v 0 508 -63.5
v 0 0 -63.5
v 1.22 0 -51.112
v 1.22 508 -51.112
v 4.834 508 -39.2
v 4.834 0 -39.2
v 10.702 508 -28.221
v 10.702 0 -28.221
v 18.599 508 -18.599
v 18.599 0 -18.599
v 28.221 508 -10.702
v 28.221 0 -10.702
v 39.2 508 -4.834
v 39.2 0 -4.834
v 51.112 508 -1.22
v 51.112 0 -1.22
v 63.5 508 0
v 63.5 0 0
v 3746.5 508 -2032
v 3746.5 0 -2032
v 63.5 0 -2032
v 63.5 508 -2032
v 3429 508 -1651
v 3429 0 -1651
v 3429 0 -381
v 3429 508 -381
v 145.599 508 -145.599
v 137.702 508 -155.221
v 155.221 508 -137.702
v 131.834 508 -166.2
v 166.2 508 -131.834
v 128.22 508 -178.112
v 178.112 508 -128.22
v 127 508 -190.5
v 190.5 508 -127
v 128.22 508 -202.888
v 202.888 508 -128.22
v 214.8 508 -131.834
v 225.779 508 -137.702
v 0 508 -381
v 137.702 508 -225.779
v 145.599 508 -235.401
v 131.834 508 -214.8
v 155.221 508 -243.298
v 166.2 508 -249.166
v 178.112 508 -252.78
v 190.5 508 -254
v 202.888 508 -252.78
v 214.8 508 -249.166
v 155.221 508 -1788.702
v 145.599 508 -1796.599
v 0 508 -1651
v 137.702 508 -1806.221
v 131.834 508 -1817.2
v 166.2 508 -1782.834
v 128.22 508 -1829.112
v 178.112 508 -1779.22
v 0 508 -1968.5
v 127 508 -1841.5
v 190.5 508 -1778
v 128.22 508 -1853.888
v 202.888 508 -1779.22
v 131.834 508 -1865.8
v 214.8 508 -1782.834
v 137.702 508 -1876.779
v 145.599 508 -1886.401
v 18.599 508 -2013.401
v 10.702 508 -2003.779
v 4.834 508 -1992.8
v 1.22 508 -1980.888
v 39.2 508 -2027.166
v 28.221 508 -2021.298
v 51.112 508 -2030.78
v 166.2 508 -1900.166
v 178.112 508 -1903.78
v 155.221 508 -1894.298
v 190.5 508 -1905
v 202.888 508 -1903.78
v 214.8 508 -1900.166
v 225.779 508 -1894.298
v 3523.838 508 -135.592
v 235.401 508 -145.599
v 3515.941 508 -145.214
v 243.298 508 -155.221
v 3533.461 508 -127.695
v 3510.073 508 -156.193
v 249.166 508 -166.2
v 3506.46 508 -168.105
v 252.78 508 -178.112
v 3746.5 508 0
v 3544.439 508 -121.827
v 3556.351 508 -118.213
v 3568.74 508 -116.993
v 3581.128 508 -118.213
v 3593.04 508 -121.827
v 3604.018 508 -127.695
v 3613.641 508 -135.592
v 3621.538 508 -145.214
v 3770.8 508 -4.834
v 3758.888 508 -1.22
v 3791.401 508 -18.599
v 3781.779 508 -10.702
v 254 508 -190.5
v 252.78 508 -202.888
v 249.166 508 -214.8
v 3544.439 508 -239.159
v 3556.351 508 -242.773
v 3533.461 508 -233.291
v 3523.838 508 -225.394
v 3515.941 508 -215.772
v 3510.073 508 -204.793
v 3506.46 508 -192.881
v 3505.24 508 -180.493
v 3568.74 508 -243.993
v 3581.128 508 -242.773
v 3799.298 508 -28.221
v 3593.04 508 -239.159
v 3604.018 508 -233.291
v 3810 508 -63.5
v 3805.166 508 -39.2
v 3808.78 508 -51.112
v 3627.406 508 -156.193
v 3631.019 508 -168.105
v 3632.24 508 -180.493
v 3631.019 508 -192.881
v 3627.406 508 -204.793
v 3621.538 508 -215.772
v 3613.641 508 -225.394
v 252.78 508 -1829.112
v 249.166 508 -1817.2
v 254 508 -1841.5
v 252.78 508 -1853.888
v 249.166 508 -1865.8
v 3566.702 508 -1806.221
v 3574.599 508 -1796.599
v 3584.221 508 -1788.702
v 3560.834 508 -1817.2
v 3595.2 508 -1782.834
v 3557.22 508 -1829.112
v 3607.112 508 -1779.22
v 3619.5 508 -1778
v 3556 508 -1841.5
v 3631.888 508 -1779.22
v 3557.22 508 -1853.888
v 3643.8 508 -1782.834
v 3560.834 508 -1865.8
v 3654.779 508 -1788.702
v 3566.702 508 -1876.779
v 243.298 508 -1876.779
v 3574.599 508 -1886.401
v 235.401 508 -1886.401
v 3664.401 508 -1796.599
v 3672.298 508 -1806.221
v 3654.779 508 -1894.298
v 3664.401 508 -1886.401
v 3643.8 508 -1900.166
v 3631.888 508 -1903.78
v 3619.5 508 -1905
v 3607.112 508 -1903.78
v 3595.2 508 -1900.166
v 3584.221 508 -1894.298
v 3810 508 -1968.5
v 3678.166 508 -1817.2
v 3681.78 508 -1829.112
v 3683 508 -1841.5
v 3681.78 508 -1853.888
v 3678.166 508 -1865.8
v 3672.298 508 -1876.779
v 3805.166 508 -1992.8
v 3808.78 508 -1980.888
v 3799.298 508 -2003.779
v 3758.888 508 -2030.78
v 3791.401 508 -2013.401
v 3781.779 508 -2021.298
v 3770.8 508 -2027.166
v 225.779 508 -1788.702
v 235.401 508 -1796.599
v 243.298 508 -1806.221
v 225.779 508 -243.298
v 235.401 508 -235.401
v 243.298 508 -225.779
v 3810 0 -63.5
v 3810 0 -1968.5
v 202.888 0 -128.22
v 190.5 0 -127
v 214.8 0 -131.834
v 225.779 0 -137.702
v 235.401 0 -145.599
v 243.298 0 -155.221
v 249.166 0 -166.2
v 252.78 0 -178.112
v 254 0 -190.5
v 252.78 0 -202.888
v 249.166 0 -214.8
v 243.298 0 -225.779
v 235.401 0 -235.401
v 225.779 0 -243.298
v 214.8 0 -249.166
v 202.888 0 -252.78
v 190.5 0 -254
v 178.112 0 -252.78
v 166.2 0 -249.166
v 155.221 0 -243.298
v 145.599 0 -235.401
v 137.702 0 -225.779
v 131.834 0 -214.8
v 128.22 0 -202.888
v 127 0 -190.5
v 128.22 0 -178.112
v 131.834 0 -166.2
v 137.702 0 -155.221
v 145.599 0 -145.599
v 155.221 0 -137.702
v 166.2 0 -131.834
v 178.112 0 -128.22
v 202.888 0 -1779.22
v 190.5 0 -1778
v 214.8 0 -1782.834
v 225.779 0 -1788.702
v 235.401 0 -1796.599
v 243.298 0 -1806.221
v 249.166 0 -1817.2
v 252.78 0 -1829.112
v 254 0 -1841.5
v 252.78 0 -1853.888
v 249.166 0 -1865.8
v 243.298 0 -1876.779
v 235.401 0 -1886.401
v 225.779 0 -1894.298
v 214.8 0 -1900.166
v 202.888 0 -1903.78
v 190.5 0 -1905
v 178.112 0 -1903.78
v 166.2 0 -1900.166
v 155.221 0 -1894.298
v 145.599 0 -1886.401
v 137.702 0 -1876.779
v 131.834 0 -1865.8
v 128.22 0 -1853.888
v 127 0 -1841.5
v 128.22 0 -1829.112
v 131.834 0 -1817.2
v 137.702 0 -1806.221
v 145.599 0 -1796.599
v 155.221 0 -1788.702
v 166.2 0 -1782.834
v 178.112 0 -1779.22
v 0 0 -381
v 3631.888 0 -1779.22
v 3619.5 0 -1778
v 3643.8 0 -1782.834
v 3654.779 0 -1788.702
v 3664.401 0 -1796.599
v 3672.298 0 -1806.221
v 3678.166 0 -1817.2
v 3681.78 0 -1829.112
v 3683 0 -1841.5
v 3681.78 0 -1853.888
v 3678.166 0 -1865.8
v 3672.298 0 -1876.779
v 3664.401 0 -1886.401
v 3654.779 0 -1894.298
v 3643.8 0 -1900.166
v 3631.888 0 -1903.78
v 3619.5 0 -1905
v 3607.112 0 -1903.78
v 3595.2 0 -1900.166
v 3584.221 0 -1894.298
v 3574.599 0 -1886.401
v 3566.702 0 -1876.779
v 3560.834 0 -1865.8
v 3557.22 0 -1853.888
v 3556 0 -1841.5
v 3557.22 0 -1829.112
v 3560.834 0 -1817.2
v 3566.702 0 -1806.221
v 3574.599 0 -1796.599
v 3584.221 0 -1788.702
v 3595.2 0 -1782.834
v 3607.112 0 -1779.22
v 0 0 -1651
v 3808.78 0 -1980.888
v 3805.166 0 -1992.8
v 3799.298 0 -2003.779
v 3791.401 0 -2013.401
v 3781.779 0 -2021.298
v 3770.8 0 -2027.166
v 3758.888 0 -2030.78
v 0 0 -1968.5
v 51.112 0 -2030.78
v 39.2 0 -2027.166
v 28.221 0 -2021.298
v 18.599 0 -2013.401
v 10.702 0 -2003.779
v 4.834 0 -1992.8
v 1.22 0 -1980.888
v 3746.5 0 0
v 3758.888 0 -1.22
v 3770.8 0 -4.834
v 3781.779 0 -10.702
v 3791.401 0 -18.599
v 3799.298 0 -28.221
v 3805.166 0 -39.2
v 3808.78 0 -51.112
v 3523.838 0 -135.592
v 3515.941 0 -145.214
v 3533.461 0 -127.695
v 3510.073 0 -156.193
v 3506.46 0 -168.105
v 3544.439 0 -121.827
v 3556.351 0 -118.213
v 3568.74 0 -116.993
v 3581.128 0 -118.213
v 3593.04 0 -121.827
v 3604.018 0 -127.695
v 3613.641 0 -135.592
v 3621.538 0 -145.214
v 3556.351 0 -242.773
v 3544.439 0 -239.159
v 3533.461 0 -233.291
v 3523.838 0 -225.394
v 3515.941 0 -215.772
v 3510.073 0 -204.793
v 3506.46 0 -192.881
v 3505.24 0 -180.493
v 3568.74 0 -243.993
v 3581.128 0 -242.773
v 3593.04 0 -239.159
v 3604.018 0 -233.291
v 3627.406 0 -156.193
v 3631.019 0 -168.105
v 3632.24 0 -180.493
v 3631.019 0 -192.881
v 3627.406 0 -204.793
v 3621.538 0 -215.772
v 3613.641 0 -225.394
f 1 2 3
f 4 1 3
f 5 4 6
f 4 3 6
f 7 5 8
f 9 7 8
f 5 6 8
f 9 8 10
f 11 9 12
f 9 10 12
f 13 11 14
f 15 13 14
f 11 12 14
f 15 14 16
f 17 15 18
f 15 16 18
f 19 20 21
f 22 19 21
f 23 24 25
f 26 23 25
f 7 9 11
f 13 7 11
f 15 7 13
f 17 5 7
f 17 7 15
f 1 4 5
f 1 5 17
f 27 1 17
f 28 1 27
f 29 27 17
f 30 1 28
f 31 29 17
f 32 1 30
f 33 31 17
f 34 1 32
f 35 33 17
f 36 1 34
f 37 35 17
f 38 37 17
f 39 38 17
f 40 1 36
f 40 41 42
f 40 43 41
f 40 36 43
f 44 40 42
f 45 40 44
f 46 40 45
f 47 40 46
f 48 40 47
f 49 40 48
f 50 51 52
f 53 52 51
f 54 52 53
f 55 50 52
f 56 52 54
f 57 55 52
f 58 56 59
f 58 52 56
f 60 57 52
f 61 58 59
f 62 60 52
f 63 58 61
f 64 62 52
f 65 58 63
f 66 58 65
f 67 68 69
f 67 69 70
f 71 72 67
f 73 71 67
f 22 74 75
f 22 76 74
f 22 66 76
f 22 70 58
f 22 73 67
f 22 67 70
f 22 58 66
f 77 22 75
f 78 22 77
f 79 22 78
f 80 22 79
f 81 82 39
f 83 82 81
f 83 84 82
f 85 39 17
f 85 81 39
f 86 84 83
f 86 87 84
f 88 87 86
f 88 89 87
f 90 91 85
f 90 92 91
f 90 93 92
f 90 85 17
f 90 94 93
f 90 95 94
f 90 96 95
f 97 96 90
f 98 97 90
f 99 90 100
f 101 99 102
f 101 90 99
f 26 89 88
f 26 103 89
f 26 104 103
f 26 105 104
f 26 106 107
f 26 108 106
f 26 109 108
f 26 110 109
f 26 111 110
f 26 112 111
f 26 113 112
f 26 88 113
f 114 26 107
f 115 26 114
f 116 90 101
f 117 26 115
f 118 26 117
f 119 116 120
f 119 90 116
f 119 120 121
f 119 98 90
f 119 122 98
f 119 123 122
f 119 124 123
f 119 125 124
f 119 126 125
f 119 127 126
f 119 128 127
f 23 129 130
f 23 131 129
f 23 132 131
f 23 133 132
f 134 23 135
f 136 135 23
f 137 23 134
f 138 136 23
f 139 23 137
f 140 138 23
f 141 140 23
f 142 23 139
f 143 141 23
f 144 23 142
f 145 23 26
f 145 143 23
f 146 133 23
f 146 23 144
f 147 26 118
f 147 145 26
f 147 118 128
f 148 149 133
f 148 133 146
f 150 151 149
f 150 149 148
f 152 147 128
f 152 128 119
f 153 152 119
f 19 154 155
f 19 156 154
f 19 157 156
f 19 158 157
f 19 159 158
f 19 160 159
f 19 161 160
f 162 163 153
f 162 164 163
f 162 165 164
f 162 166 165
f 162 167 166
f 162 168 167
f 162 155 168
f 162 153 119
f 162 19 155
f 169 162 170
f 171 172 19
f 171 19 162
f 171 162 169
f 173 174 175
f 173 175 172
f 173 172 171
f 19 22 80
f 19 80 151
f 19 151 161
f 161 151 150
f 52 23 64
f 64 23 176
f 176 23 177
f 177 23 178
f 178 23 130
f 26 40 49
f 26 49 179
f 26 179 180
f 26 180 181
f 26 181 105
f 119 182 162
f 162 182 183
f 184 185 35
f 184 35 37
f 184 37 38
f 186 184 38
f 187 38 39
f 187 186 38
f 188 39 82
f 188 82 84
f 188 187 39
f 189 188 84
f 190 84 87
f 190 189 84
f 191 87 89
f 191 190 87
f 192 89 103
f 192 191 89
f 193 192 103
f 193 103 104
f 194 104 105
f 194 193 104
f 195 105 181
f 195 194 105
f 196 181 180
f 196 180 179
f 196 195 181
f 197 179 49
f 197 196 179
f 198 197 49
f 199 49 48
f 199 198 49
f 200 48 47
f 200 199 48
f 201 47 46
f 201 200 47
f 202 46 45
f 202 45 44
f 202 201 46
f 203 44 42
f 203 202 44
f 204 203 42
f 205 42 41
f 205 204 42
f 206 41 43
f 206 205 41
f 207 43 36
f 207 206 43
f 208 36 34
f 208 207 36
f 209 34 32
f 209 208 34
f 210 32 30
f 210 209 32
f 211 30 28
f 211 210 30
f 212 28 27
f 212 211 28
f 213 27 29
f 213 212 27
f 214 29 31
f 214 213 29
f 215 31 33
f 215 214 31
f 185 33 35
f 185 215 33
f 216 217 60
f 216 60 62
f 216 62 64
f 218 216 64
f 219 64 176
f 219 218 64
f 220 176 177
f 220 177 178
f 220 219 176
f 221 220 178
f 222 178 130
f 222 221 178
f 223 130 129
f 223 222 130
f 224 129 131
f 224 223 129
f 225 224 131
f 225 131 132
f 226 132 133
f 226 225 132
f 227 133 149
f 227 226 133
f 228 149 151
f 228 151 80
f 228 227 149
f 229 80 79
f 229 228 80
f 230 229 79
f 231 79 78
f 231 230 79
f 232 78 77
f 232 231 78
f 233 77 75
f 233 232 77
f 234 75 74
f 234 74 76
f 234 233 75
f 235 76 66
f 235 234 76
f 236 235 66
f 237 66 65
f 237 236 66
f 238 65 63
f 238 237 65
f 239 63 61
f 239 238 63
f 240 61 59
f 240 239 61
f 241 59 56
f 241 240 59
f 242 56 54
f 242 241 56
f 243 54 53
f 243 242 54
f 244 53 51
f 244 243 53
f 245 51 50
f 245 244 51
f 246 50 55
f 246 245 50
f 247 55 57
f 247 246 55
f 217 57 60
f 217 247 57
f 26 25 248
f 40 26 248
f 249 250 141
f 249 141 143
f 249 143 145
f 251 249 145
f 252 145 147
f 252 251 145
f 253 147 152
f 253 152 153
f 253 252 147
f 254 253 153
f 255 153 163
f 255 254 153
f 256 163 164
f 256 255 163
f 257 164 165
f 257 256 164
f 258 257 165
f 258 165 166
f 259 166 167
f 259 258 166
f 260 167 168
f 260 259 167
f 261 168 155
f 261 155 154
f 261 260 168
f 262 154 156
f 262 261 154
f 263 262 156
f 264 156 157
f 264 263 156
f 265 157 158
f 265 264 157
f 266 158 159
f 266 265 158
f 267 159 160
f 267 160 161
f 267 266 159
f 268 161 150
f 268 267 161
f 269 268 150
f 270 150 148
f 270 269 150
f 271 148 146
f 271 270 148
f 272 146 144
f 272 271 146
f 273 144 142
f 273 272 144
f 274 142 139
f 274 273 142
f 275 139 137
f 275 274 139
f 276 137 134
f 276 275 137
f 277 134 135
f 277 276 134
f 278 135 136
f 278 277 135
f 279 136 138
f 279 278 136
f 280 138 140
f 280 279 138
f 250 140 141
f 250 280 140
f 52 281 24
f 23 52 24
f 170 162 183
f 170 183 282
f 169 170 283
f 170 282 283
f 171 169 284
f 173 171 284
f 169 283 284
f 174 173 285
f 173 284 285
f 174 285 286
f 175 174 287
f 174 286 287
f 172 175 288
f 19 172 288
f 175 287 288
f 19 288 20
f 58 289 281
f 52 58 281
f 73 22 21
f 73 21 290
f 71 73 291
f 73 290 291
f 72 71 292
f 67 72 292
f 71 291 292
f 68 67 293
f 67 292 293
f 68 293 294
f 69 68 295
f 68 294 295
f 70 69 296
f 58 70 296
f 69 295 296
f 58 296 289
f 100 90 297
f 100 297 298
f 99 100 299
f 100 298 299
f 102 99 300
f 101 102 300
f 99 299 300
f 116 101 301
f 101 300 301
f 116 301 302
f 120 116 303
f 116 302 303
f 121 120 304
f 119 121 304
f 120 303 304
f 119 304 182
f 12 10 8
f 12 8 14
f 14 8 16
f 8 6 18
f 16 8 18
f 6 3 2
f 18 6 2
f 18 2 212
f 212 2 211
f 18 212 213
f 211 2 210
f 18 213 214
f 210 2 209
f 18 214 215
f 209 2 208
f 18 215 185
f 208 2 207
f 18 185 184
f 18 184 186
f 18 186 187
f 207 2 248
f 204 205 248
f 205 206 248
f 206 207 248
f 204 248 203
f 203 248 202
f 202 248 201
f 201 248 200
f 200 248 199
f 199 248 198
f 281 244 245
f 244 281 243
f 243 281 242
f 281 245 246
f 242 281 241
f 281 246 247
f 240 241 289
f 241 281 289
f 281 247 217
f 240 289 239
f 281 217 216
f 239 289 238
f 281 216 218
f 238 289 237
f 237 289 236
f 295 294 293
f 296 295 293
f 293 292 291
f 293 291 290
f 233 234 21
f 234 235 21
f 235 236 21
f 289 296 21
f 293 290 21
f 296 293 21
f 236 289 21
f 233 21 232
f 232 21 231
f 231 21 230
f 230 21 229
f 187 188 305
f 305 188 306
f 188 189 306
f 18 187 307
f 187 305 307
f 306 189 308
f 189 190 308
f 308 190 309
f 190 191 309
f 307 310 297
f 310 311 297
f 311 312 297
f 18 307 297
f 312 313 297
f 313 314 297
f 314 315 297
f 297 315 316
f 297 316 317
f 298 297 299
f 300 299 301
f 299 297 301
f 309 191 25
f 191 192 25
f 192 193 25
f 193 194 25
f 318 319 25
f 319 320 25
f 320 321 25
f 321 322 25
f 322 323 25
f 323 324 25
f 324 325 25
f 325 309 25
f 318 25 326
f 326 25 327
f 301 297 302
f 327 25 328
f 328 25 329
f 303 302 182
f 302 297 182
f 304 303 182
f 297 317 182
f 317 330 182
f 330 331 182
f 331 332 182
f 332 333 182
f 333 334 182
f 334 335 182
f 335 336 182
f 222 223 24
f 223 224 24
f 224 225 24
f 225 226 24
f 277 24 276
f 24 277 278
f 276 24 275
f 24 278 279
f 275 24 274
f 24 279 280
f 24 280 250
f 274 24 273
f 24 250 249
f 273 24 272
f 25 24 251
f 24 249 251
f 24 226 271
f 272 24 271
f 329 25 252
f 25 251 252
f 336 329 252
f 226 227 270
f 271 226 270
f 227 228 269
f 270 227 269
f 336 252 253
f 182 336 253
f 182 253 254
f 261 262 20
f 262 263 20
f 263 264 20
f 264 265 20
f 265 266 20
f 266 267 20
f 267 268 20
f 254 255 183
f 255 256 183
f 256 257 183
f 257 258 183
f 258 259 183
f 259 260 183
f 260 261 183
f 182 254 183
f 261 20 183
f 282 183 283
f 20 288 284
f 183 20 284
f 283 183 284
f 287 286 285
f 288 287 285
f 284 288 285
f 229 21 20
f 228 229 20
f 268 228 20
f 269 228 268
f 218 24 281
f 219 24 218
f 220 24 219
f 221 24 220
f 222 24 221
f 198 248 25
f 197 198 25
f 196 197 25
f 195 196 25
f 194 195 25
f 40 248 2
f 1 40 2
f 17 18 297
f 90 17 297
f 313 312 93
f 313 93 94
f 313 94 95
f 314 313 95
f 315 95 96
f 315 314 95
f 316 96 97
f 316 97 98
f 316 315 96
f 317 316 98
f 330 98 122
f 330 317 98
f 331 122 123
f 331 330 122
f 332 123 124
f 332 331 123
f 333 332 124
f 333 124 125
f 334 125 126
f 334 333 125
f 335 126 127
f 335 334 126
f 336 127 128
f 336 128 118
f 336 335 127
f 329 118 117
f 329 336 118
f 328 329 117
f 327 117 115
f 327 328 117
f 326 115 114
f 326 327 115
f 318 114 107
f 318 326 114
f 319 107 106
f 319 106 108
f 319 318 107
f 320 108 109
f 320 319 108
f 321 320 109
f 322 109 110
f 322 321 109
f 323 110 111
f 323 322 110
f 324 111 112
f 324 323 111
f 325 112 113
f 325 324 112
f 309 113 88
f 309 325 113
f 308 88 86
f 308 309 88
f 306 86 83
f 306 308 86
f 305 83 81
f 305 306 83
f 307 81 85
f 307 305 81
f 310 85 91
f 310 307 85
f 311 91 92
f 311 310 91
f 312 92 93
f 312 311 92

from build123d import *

# Parameters (mm, degrees)
SKETCH1_R           = 63.5
BOSS_EXTRUDE1_DEPTH = 508


with BuildPart() as part:
    # Sketch1 → Boss-Extrude1 (new body)
    with BuildSketch(Plane(origin=(0, 0, 0), x_dir=(1, 0, 0), z_dir=(0, 1, 0))):
        with BuildLine():
            Line((63.5, 0), (3746.5, 0))
            ThreePointArc((3746.5, 0), (3791.401280605, 18.598719395), (3810, 63.5))
            Line((3810, 63.5), (3810, 1968.5))
            ThreePointArc((3810, 1968.5), (3791.401280605, 2013.401280605), (3746.5, 2032))
            Line((3746.5, 2032), (63.5, 2032))
            ThreePointArc((63.5, 2032), (18.598719395, 2013.401280605), (0, 1968.5))
            Line((0, 1968.5), (0, 1651))
            Line((0, 1651), (3429, 1651))
            Line((3429, 1651), (3429, 381))
            Line((3429, 381), (0, 381))
            Line((0, 381), (0, 63.5))
            ThreePointArc((0, 63.5), (18.598719395, 18.598719395), (63.5, 0))
        make_face()
        with Locations(Location((190.5, 1841.5, 0), (0, 0, 270))):
            Circle(SKETCH1_R, mode=Mode.SUBTRACT)
        with Locations(Location((190.5, 190.5, 0), (0, 0, 270))):
            Circle(SKETCH1_R, mode=Mode.SUBTRACT)
        with Locations(Location((3568.739609568, 180.492968071, 0), (0, 0, 270))):
            Circle(SKETCH1_R, mode=Mode.SUBTRACT)
        with Locations(Location((3619.5, 1841.5, 0), (0, 0, 270))):
            Circle(SKETCH1_R, mode=Mode.SUBTRACT)
    extrude(amount=BOSS_EXTRUDE1_DEPTH)


solid = part.part
